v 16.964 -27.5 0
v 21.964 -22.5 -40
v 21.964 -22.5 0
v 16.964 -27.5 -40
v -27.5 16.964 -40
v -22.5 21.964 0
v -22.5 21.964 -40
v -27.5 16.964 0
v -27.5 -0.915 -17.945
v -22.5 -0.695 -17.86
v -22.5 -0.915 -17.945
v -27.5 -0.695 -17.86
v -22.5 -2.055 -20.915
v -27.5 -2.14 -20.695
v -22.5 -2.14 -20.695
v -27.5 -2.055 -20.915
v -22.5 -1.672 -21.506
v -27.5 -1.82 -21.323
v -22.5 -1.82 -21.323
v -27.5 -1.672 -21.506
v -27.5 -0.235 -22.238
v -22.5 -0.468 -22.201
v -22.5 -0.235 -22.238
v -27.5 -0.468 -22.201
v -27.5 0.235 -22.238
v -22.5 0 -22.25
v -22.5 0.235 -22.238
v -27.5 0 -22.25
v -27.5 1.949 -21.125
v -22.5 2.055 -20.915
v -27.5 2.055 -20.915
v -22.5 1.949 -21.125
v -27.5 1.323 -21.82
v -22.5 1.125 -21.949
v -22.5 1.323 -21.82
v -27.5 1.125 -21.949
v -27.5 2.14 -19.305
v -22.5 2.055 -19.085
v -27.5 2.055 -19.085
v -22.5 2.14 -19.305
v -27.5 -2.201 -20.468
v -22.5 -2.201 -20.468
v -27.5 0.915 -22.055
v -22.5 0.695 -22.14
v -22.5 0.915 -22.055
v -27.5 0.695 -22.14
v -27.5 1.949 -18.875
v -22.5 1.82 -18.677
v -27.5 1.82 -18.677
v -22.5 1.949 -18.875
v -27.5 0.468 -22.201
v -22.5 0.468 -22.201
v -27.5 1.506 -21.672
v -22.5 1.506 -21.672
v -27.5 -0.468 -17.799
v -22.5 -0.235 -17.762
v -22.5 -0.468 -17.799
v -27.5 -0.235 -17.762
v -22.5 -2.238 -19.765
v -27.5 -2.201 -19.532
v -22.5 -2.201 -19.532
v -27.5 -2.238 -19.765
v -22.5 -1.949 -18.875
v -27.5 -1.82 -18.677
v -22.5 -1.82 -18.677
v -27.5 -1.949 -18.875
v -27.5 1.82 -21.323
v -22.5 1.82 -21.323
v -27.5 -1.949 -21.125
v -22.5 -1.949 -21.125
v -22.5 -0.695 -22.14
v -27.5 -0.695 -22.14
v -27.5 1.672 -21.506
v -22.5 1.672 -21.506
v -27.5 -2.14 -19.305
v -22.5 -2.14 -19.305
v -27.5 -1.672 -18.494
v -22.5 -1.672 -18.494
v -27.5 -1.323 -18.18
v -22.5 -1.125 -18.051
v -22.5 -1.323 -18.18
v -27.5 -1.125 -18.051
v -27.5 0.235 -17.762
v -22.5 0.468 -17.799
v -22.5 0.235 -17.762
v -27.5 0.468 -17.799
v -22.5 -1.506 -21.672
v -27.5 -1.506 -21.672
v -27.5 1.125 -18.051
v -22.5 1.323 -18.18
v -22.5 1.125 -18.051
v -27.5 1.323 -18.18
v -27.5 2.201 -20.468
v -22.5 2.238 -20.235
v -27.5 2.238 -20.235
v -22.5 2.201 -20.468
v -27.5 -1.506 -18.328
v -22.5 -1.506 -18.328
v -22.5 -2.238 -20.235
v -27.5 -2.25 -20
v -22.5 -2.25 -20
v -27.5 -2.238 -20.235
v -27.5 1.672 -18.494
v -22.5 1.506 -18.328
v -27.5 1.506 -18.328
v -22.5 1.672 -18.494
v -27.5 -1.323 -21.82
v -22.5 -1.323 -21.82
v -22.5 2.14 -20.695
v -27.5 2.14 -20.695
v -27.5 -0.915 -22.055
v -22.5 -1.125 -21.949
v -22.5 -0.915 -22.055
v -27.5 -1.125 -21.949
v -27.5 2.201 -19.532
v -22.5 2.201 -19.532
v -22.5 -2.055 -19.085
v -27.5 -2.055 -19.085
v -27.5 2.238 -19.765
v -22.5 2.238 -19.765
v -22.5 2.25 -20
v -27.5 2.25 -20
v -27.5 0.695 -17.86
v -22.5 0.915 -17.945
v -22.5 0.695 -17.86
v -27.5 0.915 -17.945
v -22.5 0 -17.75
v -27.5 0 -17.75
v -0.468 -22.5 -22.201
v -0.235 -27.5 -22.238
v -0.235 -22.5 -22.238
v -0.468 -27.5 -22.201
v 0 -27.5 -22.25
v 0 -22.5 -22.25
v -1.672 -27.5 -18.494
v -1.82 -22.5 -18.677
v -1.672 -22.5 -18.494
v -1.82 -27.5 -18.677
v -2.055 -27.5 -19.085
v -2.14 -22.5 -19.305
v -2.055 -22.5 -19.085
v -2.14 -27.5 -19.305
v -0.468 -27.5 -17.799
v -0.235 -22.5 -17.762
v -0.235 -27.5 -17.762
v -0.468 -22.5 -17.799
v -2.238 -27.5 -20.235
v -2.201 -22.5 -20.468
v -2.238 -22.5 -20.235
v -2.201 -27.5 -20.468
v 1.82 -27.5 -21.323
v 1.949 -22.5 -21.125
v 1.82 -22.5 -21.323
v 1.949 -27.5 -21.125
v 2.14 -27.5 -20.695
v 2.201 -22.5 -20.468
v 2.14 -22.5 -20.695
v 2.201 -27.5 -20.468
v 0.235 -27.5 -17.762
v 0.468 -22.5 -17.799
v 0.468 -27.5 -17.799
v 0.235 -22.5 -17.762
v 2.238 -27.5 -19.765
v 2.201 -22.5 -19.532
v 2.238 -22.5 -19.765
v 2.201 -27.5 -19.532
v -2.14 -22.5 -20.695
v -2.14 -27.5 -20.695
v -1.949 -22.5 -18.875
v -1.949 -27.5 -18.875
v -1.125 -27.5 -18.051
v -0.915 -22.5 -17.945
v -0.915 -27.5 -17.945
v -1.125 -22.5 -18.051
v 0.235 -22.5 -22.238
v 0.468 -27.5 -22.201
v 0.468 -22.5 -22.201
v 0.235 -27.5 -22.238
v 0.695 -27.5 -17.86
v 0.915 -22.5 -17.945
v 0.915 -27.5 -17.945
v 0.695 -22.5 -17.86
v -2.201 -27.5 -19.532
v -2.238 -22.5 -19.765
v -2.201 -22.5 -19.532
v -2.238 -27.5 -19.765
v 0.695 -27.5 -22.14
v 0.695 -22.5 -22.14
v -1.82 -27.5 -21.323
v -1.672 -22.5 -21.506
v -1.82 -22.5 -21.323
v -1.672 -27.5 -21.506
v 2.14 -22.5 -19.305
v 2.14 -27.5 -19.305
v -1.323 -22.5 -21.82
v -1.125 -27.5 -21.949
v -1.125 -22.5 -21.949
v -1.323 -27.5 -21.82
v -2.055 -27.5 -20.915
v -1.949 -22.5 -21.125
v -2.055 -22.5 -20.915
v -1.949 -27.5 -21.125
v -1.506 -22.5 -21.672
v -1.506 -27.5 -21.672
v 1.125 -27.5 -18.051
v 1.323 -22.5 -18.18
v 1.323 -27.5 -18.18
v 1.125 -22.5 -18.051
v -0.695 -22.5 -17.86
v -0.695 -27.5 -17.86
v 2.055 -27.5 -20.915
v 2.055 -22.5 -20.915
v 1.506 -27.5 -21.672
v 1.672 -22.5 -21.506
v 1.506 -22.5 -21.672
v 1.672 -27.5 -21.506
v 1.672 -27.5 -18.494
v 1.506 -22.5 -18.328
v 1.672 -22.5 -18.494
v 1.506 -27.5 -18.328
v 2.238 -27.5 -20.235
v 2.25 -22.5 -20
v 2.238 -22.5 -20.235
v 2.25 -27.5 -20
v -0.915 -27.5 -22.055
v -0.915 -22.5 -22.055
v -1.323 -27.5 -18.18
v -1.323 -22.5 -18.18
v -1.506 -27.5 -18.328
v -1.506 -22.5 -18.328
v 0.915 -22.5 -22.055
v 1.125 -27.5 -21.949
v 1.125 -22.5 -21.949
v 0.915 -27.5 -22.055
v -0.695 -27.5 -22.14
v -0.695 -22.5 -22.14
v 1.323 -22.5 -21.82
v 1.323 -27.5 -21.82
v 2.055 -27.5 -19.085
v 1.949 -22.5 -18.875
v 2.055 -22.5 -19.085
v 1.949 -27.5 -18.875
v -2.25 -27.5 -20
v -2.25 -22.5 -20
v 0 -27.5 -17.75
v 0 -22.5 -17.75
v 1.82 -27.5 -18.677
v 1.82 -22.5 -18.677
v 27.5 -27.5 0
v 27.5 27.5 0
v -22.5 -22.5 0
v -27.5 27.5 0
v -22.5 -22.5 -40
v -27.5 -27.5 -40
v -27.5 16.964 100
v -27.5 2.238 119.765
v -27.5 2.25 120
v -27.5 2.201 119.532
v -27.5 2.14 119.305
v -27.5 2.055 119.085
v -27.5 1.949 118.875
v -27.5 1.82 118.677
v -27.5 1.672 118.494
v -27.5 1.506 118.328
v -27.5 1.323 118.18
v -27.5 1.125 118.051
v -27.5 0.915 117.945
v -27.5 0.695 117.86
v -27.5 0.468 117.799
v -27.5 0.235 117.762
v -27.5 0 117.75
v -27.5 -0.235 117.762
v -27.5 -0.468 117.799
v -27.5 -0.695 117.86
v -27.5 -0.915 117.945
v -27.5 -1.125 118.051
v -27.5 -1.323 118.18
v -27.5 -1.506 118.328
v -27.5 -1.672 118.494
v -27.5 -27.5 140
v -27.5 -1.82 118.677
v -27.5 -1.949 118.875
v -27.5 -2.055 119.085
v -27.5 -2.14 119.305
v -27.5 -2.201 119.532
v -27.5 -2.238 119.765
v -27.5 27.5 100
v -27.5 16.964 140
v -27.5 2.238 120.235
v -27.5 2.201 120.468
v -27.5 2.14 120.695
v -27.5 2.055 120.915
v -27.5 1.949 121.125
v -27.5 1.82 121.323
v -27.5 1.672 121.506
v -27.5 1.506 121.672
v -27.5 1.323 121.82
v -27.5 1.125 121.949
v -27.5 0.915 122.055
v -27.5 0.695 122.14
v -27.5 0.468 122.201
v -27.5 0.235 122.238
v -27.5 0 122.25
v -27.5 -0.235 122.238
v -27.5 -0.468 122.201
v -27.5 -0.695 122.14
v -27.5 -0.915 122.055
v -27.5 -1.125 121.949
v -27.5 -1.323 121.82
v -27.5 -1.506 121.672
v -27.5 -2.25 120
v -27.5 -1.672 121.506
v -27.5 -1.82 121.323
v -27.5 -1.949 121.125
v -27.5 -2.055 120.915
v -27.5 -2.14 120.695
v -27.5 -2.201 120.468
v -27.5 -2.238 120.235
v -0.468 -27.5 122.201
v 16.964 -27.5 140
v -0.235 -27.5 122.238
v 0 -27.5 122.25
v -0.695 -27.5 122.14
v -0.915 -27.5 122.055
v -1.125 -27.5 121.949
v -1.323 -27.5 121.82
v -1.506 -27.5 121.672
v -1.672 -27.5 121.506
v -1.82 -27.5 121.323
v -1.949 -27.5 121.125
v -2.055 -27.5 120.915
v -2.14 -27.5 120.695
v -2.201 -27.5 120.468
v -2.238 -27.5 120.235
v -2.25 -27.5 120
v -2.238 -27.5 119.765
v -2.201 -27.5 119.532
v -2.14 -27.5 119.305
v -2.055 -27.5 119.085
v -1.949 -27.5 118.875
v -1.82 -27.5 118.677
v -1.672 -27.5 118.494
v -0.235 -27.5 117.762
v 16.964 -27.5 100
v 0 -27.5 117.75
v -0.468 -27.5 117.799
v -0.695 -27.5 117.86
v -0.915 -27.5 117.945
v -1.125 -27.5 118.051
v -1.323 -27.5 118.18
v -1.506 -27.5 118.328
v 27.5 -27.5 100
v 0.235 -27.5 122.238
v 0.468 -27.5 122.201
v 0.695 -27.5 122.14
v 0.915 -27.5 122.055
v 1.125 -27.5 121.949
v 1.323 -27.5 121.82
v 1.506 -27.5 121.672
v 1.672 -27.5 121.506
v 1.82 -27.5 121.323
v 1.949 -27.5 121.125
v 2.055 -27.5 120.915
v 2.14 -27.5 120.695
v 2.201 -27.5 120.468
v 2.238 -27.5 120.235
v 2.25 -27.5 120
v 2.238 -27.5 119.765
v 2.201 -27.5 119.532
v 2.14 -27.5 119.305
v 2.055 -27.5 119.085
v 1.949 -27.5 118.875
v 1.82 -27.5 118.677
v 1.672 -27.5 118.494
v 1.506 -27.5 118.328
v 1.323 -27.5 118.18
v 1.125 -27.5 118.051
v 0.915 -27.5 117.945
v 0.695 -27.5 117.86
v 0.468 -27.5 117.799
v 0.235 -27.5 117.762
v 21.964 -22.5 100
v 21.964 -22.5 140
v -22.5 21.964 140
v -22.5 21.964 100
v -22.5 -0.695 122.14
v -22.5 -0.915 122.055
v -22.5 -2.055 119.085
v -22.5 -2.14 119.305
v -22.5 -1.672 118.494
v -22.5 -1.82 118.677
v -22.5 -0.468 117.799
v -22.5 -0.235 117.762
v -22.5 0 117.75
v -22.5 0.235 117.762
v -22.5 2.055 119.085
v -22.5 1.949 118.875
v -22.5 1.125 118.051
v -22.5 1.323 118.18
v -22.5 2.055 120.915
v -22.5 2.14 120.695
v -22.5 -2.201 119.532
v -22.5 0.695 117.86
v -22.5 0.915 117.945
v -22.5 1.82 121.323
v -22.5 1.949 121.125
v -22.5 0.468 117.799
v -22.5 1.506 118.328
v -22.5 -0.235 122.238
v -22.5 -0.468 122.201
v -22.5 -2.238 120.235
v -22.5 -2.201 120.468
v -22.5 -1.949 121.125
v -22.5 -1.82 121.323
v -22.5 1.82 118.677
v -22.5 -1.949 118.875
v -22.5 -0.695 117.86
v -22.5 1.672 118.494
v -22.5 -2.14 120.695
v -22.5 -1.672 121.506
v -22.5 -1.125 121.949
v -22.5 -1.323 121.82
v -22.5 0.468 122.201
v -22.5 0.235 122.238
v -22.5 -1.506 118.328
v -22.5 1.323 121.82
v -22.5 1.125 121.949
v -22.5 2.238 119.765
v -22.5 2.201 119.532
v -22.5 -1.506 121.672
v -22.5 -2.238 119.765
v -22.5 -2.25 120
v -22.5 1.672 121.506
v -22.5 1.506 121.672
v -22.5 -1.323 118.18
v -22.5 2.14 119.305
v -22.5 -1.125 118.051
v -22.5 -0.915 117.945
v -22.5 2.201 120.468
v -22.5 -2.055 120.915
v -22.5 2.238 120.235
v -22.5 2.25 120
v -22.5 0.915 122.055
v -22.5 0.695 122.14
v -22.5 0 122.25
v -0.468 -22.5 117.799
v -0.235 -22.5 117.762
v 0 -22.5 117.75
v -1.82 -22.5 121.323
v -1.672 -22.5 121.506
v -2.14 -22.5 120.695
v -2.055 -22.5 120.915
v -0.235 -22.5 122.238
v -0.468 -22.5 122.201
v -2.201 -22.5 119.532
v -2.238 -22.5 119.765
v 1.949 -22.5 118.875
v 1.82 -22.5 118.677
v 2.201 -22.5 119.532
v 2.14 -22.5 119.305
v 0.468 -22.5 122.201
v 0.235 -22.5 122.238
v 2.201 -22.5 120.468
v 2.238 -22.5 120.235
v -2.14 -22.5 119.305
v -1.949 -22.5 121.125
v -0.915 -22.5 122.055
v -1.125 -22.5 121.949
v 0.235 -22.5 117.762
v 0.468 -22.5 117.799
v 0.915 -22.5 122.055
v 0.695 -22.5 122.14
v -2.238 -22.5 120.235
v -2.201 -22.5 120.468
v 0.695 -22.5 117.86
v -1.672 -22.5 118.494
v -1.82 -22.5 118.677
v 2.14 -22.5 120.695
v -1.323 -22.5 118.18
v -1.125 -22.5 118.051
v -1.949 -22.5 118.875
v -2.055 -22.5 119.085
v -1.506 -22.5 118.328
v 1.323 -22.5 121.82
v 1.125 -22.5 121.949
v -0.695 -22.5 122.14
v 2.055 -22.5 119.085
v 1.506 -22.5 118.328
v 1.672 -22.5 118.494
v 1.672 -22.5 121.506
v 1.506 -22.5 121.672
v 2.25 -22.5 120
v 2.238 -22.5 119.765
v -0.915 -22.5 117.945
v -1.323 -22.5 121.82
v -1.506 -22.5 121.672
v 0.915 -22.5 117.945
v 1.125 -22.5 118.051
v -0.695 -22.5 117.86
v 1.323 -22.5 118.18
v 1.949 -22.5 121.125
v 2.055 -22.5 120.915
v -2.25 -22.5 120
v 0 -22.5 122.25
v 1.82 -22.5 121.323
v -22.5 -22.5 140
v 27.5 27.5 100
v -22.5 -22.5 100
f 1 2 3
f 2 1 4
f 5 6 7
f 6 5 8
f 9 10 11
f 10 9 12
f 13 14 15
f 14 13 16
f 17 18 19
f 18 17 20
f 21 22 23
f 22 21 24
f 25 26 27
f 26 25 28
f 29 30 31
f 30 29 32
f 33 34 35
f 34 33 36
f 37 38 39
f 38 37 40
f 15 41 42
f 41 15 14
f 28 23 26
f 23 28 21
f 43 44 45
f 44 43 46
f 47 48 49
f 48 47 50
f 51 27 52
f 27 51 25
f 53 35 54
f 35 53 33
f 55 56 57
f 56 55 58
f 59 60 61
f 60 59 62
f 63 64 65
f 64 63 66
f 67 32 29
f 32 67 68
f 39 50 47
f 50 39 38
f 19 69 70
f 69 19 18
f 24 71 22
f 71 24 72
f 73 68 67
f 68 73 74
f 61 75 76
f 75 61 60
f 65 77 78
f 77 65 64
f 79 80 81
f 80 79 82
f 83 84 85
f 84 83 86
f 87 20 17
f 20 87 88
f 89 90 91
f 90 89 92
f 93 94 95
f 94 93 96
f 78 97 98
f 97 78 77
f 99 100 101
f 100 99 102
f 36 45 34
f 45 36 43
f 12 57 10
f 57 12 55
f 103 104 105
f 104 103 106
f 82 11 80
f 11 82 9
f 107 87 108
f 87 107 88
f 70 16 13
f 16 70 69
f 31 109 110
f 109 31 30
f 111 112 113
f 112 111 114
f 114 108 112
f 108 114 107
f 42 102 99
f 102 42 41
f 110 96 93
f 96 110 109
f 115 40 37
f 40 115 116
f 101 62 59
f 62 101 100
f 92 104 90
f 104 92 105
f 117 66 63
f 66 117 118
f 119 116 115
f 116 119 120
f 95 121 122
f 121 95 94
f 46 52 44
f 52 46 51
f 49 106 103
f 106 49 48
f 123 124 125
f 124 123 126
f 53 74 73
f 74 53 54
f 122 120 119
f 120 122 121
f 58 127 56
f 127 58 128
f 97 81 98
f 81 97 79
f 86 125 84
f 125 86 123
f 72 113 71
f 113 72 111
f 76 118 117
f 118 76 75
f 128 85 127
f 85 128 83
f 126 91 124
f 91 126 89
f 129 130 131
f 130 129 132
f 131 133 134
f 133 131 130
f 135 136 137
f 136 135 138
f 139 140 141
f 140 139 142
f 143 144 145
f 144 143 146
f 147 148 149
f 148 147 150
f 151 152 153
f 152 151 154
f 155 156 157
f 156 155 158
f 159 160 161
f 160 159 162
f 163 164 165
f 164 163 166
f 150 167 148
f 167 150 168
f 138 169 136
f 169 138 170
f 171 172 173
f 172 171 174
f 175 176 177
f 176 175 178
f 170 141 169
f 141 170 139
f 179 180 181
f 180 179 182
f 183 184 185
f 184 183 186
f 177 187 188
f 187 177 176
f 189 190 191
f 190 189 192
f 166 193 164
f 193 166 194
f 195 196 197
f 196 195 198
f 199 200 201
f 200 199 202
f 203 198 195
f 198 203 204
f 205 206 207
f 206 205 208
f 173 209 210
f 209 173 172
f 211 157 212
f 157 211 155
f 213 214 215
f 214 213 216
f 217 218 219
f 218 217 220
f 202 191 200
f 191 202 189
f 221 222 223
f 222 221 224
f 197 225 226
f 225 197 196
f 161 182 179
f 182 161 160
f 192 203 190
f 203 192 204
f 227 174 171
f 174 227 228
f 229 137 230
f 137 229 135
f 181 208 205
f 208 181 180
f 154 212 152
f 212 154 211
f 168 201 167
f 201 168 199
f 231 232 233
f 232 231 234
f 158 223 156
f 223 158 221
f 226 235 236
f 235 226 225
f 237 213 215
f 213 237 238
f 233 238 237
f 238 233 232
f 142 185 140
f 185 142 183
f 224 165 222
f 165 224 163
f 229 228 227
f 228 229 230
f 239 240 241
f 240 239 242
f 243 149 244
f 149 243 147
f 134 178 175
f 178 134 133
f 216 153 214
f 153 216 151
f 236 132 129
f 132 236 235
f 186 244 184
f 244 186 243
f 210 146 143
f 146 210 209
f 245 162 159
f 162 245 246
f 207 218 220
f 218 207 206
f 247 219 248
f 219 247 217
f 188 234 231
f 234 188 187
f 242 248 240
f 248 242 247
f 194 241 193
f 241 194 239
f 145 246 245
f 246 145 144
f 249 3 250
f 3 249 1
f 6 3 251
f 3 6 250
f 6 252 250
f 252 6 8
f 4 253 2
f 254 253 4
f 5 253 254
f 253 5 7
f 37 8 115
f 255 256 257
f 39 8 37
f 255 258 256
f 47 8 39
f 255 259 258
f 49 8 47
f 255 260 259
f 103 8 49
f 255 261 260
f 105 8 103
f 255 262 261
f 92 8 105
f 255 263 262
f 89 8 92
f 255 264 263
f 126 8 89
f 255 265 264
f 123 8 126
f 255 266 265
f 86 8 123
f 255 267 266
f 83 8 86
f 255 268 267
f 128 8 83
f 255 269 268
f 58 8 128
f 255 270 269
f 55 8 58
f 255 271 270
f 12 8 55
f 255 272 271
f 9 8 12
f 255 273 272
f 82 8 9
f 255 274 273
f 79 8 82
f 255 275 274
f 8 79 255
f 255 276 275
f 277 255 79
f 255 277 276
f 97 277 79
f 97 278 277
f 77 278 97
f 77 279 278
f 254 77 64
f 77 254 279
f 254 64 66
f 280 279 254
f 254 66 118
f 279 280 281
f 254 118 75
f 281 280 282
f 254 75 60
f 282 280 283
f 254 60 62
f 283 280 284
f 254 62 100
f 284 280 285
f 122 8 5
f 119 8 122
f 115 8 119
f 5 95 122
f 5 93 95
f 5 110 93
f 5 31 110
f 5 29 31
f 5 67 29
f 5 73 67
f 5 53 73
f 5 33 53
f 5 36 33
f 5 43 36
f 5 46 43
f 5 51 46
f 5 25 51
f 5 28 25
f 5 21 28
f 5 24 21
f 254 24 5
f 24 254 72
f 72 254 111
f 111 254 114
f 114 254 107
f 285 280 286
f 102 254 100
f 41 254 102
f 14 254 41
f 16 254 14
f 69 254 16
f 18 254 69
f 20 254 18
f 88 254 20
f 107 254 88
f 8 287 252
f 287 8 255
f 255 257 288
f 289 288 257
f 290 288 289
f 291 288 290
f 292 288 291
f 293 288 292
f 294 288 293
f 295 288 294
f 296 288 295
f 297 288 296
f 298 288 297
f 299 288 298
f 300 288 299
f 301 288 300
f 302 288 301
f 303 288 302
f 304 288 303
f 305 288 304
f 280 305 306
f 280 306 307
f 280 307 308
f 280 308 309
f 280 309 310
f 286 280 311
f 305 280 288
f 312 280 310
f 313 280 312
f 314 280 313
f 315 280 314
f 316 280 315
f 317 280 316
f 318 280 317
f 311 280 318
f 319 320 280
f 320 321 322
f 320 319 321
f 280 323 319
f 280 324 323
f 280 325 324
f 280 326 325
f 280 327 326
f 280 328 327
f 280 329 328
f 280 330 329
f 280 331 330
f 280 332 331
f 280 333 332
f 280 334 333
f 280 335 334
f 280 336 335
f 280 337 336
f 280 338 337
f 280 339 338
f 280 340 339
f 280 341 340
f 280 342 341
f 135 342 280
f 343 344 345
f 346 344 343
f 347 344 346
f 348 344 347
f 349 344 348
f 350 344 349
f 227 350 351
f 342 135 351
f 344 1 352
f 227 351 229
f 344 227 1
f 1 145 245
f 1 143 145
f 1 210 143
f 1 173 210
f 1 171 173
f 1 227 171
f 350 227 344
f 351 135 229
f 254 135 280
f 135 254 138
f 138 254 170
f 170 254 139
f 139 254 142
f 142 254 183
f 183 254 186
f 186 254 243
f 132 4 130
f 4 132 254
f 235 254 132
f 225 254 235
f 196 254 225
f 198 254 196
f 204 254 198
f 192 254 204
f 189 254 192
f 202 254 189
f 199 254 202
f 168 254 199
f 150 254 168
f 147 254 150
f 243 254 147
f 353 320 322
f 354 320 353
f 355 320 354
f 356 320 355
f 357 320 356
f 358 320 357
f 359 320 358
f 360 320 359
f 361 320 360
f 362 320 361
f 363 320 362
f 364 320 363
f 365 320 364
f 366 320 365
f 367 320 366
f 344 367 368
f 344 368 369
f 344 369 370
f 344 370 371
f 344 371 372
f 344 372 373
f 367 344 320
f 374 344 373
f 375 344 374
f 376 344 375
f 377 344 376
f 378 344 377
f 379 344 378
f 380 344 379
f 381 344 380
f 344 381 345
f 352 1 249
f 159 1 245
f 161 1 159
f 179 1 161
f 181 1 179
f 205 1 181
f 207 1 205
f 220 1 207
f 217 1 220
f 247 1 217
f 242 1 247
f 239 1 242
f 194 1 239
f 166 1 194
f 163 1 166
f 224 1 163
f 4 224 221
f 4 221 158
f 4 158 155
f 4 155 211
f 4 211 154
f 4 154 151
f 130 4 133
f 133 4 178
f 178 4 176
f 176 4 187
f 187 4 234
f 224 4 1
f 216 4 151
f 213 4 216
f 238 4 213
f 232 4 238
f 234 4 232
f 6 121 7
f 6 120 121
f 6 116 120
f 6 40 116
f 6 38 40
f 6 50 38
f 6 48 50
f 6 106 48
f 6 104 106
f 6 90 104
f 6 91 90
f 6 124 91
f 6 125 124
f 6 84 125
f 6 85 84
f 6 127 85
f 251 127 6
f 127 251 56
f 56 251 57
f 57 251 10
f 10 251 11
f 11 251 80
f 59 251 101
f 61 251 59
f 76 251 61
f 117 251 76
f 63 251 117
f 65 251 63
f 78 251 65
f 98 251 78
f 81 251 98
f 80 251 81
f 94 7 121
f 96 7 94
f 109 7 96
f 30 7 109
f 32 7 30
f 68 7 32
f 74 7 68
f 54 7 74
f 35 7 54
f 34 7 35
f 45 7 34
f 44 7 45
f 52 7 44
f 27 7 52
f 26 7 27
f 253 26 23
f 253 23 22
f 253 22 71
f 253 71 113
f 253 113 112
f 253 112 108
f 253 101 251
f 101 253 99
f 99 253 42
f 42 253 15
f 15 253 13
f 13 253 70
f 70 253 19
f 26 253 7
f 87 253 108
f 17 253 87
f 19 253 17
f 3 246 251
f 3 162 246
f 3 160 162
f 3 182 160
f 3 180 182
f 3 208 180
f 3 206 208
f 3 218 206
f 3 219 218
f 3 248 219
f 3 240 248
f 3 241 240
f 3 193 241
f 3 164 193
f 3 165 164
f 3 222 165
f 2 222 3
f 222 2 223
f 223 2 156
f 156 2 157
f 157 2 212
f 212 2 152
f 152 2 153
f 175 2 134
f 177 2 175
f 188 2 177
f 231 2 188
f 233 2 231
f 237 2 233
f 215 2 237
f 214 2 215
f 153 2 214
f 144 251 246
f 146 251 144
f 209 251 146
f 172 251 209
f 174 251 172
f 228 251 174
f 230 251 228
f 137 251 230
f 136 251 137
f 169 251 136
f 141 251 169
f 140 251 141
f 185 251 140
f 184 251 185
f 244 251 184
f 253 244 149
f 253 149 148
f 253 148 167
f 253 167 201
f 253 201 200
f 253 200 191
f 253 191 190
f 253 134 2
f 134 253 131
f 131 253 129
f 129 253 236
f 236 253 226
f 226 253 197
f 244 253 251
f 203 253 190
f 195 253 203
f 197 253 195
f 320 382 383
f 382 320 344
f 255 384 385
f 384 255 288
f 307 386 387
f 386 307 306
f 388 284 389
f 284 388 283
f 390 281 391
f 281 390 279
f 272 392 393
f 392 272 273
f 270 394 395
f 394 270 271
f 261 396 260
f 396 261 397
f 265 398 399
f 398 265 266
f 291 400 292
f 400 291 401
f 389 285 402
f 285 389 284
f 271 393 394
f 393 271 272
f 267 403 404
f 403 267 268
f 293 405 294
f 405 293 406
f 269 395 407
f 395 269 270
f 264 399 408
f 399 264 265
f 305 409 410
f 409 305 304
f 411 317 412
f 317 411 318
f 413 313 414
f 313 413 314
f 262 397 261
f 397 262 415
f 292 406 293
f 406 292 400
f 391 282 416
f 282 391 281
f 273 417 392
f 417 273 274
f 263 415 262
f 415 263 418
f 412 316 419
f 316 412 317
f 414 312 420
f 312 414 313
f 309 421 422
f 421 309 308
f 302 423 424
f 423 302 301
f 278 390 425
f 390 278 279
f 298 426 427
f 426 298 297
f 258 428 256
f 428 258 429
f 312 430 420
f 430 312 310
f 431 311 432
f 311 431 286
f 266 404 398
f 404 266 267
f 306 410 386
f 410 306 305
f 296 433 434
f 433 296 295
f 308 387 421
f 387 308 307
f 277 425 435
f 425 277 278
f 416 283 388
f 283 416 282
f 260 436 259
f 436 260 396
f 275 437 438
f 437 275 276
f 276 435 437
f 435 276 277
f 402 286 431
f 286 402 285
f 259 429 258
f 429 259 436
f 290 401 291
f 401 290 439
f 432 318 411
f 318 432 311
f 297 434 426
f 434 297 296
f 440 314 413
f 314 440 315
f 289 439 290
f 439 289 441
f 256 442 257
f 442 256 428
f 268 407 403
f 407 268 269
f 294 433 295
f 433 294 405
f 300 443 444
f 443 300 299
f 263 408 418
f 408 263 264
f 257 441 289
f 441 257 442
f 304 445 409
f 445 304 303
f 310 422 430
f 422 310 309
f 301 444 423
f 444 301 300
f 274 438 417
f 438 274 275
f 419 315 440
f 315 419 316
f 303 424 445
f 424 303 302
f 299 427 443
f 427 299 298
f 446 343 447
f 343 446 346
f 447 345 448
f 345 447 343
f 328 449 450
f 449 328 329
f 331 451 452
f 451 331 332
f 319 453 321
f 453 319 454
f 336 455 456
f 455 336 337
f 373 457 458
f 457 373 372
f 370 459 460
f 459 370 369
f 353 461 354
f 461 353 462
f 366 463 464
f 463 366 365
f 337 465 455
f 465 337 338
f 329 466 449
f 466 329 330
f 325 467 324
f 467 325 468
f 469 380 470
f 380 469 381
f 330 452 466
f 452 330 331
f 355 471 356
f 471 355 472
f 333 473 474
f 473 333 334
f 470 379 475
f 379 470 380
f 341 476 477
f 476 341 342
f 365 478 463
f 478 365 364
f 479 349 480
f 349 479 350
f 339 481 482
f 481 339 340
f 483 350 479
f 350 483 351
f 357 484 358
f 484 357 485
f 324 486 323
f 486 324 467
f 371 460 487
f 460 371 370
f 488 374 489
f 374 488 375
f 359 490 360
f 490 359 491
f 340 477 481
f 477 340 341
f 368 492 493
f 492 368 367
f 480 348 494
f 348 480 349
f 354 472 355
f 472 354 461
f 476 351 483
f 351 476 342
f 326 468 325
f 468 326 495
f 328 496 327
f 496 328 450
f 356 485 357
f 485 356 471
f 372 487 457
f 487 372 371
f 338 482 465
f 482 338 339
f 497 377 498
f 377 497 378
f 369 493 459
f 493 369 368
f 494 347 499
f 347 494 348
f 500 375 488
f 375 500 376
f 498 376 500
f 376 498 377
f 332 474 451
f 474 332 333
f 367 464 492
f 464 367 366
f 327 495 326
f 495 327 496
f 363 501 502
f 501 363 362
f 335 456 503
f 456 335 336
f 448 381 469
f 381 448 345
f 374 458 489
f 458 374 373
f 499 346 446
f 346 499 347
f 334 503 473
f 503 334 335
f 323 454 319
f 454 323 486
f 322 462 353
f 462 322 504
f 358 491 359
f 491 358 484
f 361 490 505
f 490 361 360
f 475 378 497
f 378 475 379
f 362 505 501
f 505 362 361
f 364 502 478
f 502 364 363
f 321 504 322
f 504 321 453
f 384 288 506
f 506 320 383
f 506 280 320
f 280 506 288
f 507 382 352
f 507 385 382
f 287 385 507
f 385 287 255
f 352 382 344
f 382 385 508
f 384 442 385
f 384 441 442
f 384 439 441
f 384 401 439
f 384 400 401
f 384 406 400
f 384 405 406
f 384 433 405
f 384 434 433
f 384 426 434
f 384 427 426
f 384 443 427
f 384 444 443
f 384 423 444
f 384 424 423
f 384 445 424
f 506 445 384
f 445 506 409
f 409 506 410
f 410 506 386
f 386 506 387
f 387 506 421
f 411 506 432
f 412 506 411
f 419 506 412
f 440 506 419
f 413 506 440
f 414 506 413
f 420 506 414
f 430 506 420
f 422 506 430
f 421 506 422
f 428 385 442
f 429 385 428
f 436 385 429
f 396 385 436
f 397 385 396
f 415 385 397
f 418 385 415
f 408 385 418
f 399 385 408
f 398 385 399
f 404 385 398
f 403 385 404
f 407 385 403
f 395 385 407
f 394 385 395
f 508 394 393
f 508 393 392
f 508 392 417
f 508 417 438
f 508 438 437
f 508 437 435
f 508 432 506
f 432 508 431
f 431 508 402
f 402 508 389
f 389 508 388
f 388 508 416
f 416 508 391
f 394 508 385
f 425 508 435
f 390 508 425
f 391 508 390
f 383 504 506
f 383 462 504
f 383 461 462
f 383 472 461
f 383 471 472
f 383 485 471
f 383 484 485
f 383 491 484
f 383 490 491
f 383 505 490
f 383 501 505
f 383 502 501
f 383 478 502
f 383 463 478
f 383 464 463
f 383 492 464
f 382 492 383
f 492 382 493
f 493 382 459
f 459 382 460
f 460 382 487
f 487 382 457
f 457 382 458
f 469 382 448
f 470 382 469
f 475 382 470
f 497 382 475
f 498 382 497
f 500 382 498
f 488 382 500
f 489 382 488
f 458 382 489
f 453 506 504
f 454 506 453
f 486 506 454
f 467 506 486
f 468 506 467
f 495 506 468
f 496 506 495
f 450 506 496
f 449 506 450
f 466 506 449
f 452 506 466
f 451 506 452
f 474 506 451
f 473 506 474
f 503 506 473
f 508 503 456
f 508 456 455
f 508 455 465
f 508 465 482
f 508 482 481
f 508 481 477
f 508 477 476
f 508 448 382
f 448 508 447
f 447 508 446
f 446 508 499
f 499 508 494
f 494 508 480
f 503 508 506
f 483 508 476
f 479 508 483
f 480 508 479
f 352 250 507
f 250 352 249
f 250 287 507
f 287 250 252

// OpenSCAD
// file: lack_table.scad
lack_table();

module lack_table(){
    translate([0,0,400]) lack_top();
    for(X=[-1,1], Y=[-1,1]) translate([247.5*X, 247.5*Y, 0]) lack_leg();
}

module lack_leg(){
    translate([0,0,200]) cube([50,50,400], center=true);
}

module lack_top(){
    translate([0,0,25]) cube([550,550,50], center=true);
}
// main file
$fn=60;
use <lack_table.scad>;
fudge=0.2;

//translate([20,25,0]) rotate([90,0,0]) %front_alignment();
//translate([-119-107,25,0]) rotate([90,0,180]) %middle_alignment();
//drawer_slide();

//intersection(){
//    drawer_slide();
//    translate([-125,0,0]) cube([250,0.5,10], center=true);
//}
//intersection(){
//    drawer_slide();
//    translate([-248,0,0]) cube([20,0.5,50], center=true);
//}

//intersection(){
//    drawer_slide();
//    translate([125,0,0]) cube([250,0.5,10], center=true);
//}
//intersection(){
//    drawer_slide();
//    translate([248,0,0]) cube([20,0.5,50], center=true);
//}

//drawer_support2();
//drawer_support_link();
//intersection(){
//    drawer_support();
//    translate([-125,25,0]) cube([250,2,10], center=true);
//}
//intersection(){
//    drawer_support();
//    translate([-1,25-2.5,0]) cube([2,5,50], center=true);
//}

//drawer_slide();

//translate([0,0,0]) cylinder(d=4, h=3);
//translate([16,0,0]) cylinder(d=6, h=3);
//translate([8,0,-0.9]) cube([25,10,2],center=true);

//lack_spacer_back();
//lack_back();
//    rotate([0,0,-90]) drawer_support();
//    rotate([0,0,90]) drawer_support();

//%cube([100,180,100], center=true);
//lack_back();


lack_spacer();
//lack_cart();
//lack_back();
//lack_spacer_back();

//translate([0,250,300]) %cube([450,50,50], center=true);
//translate([250,0,500]) %cube([50,440,50], center=true);

module front_alignment(){
    difference(){
        translate([-75,0,0]) cube([150,10,0.5],center=true);
        translate([-6,0,-1]) cylinder(d=4, h=3);
        translate([-35,0,-1]) cylinder(d=6, h=3);
        translate([-51,0,-1]) cylinder(d=4, h=3);
        translate([-99,0,-1]) cylinder(d=6, h=3);
        translate([-115,0,-1]) cylinder(d=4, h=3);
        translate([-139,0,-1]) cylinder(d=4, h=3);
    }
}

module middle_alignment(){
    difference(){
        translate([-65,0,0]) cube([130,10,0.5],center=true);
        translate([-7,0,-1]) cylinder(d=6, h=3);
        translate([-23,0,-1]) cylinder(d=4, h=3);
        translate([-103,0,-1]) cylinder(d=6, h=3);
        translate([-119,0,-1]) cylinder(d=4, h=3);
    }
}

module drawer_support2(length=222.5){
    difference(){
        drawer_support(length=length);
        translate([-5-length/2,-12.51+5,0]) 
            cube([length,55,25], center=true);
    }
}

module drawer_support(length=222.5){
    difference(){
        union(){
            translate([-length/2,0,0]) 
                cube([length,50,50], center=true);
            translate([-2.5,0,0]) 
                cube([5,50,150], center=true);
            hull(){
                translate([-2.5,22.5,0]) 
                    cube([5,5,150], center=true);
                translate([-50,22.5,0]) 
                    cube([50,5,50], center=true);
            }
        }
        translate([-5-length/2,-12.51,0]) 
            cube([length,25,25], center=true);
        translate([-length+25,-12.51,0]) 
            cube([10,25,40], center=true);
        for(X=[-15, -31, -79, -95, -119]) translate([X,0,0]) 
            rotate([90,0,0]) {
                cylinder(d=4.5, h=100, center=true);
                translate([0,0,-4]) fhex(m4_hex_nut+fudge,10);
            }
//        for(X=[-107, -123, -203, -219]) translate([X,0,0]) 
        for(X=[-110, -190, -206]) translate([X,0,0]) 
            rotate([90,0,0]) {
                cylinder(d=4.5, h=100, center=true);
                translate([0,0,-4]) fhex(m4_hex_nut+fudge,10);
            }
        for(Z=[-40,-65,40,65])
            translate([0,-4,Z]) rotate([0,90,0]) 
            cylinder(d=4.5, h=20, center=true);
    }
}

module lack_cart(height=100){
//    translate([0,0,50]) %cube([100,100,230]);

    translate([0,0,550]){
        translate([0,0,0]) color("blue") lack_table();
//        translate([0,0,-250]) %cube([100,100,650]);
    }
    translate([0,0,400]){
        translate([247.5, 0, 100]) lack_back();
        
        translate([247.5, 245, 50]) 
            lack_spacer_back(height=height);
        translate([247.5, -245, 150]) 
            rotate([180,0,0]) lack_spacer_back(height=height);
        translate([-247.5, -247.5, 50]) 
            rotate([0,0,180]) lack_spacer(height=height);
        translate([-247.5, 247.5, 50]) 
            rotate([0,0,90]) lack_spacer(height=height);
    }
//    for(X=[-1,1], Y=[-1,1]) translate([247.5*X, 247.5*Y, 50]) 
//        rotate([0,0,90*-X*-Y]) lack_spacer(height=100);
//
    translate([0,0,450+70]) color("green") 
        rotate([0,180,0]) lack_table();
//    translate([5,-250,195]) %cube([220,5,220]);
    translate([222.5,-250,300]) drawer_support();
    translate([-222.5,-250,300]) rotate([180,0,180]) drawer_support();
//    translate([0,-265,300]) drawer_support_link();
//    translate([0,-250,300]) rotate([0,180,0]) drawer_support();
    for(Y=[-1]) 
        %translate([-7.5,222.5*Y,301]) drawer_slide();
    for(X=[-1,1], Y=[-1,1]) translate([230*X, 230*Y, 0]) red_caster();
}

module drawer_support_link(){
    cube([50,25-fudge,25-fudge*2], center=true);
    for(X=[-1,1]) translate([25*X+fudge, 0, 0]) 
        cube([10-fudge*2, 25-fudge, 40-fudge*2], center=true);
}

module drawer_slide(){
    difference(){
        cube([500, 13, 45.5], center=true);
        translate([250,7.5,-1]) rotate([90,0,0]){
            translate([-6,0,-1]) cylinder(d=4, h=20);
            translate([-35,0,-1]) cylinder(d=6, h=20);
//            translate([-51,0,-1]) cylinder(d=4, h=20);
            translate([-51,0,-1]) hull()
            for(x=[-1,1]) translate([3*x, 0,0]) 
                cylinder(d=4.5, h=20);
            translate([-99,0,-1]) cylinder(d=6, h=20);
//            translate([-115,0,-1]) cylinder(d=4, h=20);
            translate([-115,0,-1]) hull()
            for(x=[-1,1]) translate([3*x, 0,0]) 
                cylinder(d=4.5, h=20);
//            translate([-139,0,-1]) cylinder(d=4, h=20);
            translate([-139,0,-1]) hull()
            for(x=[-1,1]) translate([3*x, 0,0]) 
                cylinder(d=4.5, h=20);
        }
        translate([0,7.5,-1]) rotate([90,0,0]){
            translate([-9,0,-1]) cylinder(d=6, h=20);
            translate([-25,0,-1]) cylinder(d=4, h=20);
            translate([-105,0,-1]) cylinder(d=6, h=20);
            translate([-121,0,-1]) cylinder(d=4, h=20);
        }
        for(Z=[-1,1]) translate([-250+6,0,7.5*Z]) 
            rotate([90,0,0]) cylinder(d=4.5, h=20, center=true);
    }
}

module lack_spacer_back(height=100, width=127.5){
    difference(){
        union(){
            lack_spacer(height=height);
            translate([0,-width/2-27.5,height/2]) 
                cube([55,width,50], center=true);
        }
        translate([7,-width-15,height/2])
            cube([41+fudge,30+fudge,25+fudge], center=true);
        translate([7,-width+5-fudge,height/2])
            cube([41+fudge,10+fudge*2,40+fudge], center=true);
    }
}

module lack_back(width=180){
    cube([55,width,50], center=true);
    for(X=[-1,1]){
        translate([7,((width/2)+14)*X,0])
            cube([41,30,25], center=true);
        translate([7,((width/2)+32.5-fudge)*X,0])
            cube([41,10,40], center=true);
    }
}

module lack_spacer(height=100){
    translate([2.5,2.5,height]) %cube([50,50,50], center=true);
    for(Z=[-20,height+20]) translate([0,0,Z])
    difference(){
        cube([55,55,40], center=true);
        translate([2.5,2.5,0]) cube([50,50,42], center=true);
        for(R=[-1,1]) translate([-24*R,24*R,0]) 
            rotate([0,0,45]) cube([40,5,42], center=true);
        translate([-25,25,0]) 
            cube([40,5,42], center=true);
        translate([25,-25,0]) 
            cube([5,40,42], center=true);
        for(R=[0,90]) rotate([0,90,R]) 
            cylinder(d=4.5, h=100, center=true);
    }
    translate([0,0,height/2]) cube([55,55,height], center=true);
}

module red_caster(){
    translate([0,0,70]) rotate([0,180,0]) union(){
        difference(){
            cube([50,50,1.40], center=true);
            
        }
        translate([20,0,45]) rotate([90,0,0])
            cylinder(d=49, h=20, center=true);
//    for(R=[0:10:660]) rotate([0,0,R])
//    translate([20,0,45]) rotate([90,0,0]) 
//        cylinder(d=49, h=20, center=true);
        translate([0,0,34.75]) 
            %cube([90,90,70], center=true);
    }
}

m3_hex_nut=5.6;
m3_nut_height=2.25;
m4_hex_nut=7.2;
m4_nut_height=2.9;
m5_hex_nut=7.8;
m5_nut_height=3.9;

module fhex(wid,height){
  hull(){
    cube([wid/1.7,wid,height],center=true);
    rotate([0,0,120]) cube([wid/1.7,wid,height], center=true);
    rotate([0,0,240]) cube([wid/1.7,wid,height], center=true);
  }
}
